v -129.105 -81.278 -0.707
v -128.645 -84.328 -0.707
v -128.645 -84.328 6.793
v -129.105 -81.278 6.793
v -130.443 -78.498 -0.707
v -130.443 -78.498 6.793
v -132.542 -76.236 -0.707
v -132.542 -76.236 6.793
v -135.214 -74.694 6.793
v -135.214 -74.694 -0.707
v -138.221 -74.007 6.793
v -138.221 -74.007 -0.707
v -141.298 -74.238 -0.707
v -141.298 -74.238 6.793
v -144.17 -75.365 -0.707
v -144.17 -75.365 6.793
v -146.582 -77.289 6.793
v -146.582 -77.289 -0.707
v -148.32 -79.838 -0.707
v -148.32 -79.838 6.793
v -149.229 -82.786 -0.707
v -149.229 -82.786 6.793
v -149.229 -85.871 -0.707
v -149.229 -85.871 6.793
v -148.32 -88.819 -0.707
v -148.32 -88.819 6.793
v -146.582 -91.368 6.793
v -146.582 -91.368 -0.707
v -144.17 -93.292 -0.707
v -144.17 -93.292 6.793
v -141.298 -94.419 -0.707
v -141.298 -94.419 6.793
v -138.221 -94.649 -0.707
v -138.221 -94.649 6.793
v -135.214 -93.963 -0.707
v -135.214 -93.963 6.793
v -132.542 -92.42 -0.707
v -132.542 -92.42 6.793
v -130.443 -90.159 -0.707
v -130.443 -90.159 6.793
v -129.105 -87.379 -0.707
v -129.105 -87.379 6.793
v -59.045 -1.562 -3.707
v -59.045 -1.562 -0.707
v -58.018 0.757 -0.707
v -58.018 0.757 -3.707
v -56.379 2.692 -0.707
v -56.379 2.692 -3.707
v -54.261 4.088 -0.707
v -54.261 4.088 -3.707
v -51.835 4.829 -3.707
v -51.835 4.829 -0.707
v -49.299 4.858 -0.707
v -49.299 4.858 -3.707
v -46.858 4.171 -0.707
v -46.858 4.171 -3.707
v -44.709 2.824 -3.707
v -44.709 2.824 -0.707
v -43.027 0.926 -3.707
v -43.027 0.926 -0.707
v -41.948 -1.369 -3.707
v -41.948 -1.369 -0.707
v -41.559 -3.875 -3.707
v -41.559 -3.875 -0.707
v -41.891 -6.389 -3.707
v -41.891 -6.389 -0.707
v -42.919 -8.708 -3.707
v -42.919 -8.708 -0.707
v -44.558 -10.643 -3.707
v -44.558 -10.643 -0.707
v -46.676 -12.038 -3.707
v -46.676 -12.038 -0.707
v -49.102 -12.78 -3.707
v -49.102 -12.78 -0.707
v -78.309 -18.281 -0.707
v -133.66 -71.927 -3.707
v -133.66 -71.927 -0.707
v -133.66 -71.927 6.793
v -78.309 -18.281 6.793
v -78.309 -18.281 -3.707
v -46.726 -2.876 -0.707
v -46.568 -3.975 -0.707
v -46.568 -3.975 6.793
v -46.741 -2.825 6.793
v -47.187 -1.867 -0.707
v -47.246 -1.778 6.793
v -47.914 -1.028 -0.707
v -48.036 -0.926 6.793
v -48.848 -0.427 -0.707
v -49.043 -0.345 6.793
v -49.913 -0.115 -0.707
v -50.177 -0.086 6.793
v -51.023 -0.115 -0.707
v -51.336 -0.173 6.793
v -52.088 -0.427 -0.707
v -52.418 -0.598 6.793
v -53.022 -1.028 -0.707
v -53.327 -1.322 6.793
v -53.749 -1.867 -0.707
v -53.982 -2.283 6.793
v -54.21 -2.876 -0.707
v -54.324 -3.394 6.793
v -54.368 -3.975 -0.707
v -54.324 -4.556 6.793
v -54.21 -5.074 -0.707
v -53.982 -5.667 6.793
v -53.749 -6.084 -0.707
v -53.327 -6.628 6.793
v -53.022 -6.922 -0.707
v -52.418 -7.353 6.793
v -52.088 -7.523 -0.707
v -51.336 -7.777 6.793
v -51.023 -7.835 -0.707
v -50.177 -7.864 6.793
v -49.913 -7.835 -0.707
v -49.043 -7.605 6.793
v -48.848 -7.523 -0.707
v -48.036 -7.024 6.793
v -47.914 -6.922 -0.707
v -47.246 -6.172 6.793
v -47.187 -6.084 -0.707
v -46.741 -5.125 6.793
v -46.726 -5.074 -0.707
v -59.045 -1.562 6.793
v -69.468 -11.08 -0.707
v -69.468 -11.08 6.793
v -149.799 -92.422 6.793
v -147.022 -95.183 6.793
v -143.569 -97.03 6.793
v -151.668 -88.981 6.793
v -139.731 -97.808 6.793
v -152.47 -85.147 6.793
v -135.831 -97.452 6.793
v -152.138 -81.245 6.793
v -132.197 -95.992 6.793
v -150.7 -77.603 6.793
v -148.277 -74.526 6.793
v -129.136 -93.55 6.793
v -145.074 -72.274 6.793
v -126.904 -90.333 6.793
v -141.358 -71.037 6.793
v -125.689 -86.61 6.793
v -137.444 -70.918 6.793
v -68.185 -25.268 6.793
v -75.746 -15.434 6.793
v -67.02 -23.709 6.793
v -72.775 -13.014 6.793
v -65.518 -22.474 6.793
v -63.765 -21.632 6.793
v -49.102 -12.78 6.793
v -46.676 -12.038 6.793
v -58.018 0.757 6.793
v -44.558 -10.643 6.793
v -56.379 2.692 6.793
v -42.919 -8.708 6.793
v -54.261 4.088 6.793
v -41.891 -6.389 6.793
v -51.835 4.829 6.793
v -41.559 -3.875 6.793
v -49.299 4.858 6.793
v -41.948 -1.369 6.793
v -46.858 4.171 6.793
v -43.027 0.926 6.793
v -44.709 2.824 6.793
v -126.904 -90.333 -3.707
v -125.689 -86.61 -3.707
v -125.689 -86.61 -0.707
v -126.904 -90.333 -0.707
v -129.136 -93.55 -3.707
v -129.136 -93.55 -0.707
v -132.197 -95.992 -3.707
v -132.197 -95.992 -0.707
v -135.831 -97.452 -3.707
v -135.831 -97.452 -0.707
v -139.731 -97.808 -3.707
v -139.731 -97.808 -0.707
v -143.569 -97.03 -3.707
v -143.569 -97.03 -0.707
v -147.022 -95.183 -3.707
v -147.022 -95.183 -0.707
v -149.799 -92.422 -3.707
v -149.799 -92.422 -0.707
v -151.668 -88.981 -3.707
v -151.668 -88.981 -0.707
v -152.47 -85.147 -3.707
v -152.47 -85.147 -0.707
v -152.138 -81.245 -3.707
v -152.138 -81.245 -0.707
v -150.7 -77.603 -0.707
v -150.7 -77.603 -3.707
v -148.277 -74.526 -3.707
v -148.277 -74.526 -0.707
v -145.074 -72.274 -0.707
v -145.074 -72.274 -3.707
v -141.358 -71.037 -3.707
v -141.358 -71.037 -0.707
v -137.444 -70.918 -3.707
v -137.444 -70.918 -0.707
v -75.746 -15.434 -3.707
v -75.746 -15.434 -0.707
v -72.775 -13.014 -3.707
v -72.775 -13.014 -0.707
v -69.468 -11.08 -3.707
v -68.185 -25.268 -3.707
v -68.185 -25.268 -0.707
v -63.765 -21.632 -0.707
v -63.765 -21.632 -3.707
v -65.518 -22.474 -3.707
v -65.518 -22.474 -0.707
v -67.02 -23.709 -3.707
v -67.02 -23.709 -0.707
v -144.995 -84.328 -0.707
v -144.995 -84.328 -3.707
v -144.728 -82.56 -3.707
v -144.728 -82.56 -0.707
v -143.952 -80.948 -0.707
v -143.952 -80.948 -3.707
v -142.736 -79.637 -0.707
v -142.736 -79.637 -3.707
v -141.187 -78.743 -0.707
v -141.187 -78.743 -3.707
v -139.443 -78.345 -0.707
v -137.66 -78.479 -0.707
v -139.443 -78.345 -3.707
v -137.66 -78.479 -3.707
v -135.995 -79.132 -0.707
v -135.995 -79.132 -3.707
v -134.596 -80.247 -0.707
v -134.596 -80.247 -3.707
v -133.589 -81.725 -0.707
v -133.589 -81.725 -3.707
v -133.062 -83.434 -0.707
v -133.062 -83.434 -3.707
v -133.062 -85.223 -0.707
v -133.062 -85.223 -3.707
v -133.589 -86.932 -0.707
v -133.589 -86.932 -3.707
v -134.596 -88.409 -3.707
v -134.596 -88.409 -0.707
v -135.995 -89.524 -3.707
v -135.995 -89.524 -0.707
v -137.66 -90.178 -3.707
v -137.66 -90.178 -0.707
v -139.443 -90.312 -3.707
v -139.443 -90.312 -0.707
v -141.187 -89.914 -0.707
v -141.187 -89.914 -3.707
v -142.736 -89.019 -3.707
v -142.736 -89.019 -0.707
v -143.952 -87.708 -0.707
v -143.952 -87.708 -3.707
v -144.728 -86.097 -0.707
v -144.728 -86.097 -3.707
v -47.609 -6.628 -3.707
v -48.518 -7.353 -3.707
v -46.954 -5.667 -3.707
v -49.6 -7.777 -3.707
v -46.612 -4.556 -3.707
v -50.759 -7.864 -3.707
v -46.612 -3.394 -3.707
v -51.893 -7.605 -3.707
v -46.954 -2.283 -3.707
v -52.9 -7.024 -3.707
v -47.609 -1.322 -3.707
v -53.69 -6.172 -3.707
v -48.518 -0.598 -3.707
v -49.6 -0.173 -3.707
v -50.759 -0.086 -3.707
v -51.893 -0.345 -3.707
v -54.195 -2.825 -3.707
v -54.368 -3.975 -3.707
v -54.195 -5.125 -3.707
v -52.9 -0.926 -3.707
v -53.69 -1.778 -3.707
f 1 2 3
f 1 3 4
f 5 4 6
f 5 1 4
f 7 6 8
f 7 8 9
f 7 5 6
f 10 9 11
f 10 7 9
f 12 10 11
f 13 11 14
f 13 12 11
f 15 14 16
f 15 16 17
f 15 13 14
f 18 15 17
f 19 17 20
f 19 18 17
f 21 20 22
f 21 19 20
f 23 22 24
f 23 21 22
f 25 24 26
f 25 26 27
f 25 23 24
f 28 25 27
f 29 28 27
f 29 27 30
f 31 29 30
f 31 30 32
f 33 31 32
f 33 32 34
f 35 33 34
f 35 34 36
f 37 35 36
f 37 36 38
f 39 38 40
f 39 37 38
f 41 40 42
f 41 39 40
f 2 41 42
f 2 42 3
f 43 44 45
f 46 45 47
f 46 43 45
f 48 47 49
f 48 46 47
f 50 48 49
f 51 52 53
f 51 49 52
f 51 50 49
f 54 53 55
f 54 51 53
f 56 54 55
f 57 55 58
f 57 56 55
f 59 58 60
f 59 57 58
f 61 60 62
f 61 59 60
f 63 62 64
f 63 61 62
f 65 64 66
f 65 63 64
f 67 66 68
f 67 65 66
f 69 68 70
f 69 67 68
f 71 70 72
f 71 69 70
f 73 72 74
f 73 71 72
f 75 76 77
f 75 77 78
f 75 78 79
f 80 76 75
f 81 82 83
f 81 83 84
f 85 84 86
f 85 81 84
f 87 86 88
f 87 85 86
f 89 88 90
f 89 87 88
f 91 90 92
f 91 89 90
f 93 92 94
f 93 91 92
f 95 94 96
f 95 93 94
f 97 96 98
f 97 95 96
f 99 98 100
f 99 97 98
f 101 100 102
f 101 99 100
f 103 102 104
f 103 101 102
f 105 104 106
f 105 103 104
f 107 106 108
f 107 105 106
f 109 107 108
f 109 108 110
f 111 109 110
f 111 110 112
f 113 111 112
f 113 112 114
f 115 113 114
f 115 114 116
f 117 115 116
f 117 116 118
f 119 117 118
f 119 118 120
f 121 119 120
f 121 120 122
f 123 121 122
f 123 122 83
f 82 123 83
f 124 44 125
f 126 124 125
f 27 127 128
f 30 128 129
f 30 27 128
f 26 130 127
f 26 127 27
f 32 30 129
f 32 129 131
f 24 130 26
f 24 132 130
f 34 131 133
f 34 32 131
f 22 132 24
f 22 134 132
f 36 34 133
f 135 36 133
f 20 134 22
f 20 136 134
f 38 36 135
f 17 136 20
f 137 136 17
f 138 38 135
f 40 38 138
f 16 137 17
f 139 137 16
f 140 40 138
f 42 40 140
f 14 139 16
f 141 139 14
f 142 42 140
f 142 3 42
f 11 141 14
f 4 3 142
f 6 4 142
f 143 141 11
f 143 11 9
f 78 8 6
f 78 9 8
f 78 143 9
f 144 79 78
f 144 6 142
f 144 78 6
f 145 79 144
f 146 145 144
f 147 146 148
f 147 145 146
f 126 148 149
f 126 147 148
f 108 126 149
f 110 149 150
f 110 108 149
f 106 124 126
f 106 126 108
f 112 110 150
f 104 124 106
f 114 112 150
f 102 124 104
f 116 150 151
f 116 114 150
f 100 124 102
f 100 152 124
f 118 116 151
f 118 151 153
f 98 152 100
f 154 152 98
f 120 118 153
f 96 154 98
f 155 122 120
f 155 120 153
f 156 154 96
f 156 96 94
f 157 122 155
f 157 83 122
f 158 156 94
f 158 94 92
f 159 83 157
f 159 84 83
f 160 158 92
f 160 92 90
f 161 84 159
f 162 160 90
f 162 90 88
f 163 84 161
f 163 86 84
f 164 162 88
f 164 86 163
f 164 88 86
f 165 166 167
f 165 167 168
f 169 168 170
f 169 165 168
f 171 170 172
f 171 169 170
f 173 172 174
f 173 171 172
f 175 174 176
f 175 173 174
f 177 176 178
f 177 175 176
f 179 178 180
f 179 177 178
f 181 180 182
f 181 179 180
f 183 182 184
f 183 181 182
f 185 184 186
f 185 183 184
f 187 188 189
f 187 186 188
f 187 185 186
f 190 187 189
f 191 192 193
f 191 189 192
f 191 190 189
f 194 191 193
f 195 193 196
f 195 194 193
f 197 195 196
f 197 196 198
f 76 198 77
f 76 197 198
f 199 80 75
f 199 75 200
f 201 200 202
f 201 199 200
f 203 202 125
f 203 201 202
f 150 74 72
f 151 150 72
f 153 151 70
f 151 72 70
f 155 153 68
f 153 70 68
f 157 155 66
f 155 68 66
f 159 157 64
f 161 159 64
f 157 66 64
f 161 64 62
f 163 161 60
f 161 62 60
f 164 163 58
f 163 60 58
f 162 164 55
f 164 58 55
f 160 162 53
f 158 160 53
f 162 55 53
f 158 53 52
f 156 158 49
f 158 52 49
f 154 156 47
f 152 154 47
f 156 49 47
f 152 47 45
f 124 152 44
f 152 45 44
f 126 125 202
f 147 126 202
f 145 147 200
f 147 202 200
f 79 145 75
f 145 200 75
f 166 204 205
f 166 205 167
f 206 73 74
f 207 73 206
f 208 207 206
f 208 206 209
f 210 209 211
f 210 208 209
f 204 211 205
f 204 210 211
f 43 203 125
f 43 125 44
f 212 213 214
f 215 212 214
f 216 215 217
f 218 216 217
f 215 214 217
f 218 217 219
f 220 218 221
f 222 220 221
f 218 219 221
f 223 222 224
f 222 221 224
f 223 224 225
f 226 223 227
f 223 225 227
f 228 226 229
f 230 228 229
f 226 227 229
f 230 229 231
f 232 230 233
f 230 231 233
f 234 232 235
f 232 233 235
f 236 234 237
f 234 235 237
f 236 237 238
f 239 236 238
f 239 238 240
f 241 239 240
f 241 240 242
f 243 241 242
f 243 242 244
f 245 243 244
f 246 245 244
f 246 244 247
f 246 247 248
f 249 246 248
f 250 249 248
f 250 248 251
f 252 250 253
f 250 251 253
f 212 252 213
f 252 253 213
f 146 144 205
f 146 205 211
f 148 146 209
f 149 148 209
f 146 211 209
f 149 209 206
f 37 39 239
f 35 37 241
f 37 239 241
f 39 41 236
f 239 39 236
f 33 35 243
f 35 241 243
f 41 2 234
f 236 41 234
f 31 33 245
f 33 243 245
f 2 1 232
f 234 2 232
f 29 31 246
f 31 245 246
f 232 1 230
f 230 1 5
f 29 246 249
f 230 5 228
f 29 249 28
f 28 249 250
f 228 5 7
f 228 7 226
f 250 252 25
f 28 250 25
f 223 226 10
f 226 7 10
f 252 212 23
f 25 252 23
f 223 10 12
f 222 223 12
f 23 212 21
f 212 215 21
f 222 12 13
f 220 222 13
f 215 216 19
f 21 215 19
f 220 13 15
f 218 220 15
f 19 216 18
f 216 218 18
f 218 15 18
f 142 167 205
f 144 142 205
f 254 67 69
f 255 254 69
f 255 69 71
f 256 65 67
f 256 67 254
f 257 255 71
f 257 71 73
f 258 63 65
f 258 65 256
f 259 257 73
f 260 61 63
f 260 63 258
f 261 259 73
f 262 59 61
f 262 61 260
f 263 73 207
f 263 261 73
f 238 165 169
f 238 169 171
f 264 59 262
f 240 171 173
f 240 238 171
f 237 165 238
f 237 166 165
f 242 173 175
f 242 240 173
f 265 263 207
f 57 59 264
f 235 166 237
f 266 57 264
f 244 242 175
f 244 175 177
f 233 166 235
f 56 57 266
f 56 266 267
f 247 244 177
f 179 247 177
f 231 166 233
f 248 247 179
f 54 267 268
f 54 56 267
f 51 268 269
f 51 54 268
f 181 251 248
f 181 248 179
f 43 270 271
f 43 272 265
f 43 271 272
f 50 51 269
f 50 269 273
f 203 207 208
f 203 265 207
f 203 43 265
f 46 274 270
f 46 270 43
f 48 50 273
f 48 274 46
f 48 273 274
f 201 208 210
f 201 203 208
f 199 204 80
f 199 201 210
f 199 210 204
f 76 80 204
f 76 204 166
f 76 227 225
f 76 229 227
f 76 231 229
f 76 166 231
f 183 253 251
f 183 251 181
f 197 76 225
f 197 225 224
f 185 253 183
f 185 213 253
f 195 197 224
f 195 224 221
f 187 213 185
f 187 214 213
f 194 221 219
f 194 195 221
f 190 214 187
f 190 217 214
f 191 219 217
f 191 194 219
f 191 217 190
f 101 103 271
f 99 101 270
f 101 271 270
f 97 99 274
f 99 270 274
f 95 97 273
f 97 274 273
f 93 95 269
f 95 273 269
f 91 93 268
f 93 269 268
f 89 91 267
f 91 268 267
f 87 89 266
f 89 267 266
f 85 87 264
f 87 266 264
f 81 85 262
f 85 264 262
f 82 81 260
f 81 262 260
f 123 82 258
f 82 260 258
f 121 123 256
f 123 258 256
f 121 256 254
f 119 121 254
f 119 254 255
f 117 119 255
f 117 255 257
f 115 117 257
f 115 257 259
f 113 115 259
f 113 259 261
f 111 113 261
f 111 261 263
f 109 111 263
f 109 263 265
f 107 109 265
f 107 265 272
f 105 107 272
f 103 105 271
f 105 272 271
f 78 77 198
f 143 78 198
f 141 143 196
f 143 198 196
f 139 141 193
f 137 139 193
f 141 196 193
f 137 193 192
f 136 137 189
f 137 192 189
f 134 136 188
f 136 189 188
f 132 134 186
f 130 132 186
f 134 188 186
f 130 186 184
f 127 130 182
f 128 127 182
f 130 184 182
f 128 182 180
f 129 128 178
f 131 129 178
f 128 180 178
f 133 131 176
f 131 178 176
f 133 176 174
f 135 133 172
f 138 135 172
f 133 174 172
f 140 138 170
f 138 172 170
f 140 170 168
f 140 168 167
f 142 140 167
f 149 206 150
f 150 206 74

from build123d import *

# Parameters (mm, degrees)
SKETCH1_R           = 2.6
SKETCH1_R_2         = 6.9
BOSS_EXTRUDE1_DEPTH = 5
BOSS_EXTRUDE2_START = 2
SKETCH2_R           = 4
SKETCH2_R_2         = 2.6
BOSS_EXTRUDE2_DEPTH = 2
SCALE1_SCALE        = 1.5


with BuildPart() as part:
    # Sketch1 → Boss-Extrude1 (new body)
    with BuildSketch(Plane.XY):
        with BuildLine():
            Line((-116.116459466, -73.116163472), (-77.780395614, -32.221656848))
            ThreePointArc((-77.780395614, -32.221656848), (-76.528201342, -30.740668075), (-74.833515464, -29.797610273))
            Line((-74.833515464, -29.797610273), (-65.058269204, -23.896184603))
            ThreePointArc((-65.058269204, -23.896184603), (-61.52405595, -14.086356432), (-71.687164611, -16.417582375))
            Line((-71.687164611, -16.417582375), (-78.635941465, -22.763122171))
            ThreePointArc((-78.635941465, -22.763122171), (-81.861894444, -24.820779517), (-84.529701766, -27.563684997))
            Line((-84.529701766, -27.563684997), (-121.430579381, -63.327828505))
            ThreePointArc((-121.430579381, -63.327828505), (-132.896560675, -75.889442497), (-116.116459466, -73.116163472))
        make_face()
        with Locations((-65.969197132, -18.026447785)):
            Circle(SKETCH1_R, mode=Mode.SUBTRACT)
        with Locations((-124.987033061, -71.595333402)):
            Circle(SKETCH1_R_2, mode=Mode.SUBTRACT)
    extrude(amount=BOSS_EXTRUDE1_DEPTH)

    # Sketch2 → Boss-Extrude2 (add)
    with BuildSketch(Plane(origin=(0, 0, 0), x_dir=(-1, 0, 0), z_dir=(0, 0, -1)).offset(BOSS_EXTRUDE2_START)):
        with BuildLine():
            Line((121.430579381, -63.327828505), (84.529701766, -27.563684997))
            ThreePointArc((84.529701766, -27.563684997), (81.861894444, -24.820779517), (78.635941465, -22.763122171))
            Line((78.635941465, -22.763122171), (71.687164611, -16.417582375))
            ThreePointArc((71.687164611, -16.417582375), (61.52405595, -14.086356432), (65.058269204, -23.896184603))
            Line((65.058269204, -23.896184603), (74.833515464, -29.797610273))
            ThreePointArc((74.833515464, -29.797610273), (76.528201342, -30.740668075), (77.780395614, -32.221656848))
            Line((77.780395614, -32.221656848), (116.116459466, -73.116163472))
            ThreePointArc((116.116459466, -73.116163472), (132.896560675, -75.889442497), (121.430579381, -63.327828505))
        make_face()
        with Locations((124.987033061, -71.595333402)):
            Circle(SKETCH2_R, mode=Mode.SUBTRACT)
        with Locations((65.969197132, -18.026447785)):
            Circle(SKETCH2_R_2, mode=Mode.SUBTRACT)
    extrude(amount=-BOSS_EXTRUDE2_DEPTH)


with BuildPart() as part_1:
    # Scale1: scaled about (-96.971512975, -46.1293356, 1.414619299)
    add(part.part.scale(SCALE1_SCALE).moved(Location((48.485756487, 23.0646678, -0.707309649))))


solid = part_1.part
